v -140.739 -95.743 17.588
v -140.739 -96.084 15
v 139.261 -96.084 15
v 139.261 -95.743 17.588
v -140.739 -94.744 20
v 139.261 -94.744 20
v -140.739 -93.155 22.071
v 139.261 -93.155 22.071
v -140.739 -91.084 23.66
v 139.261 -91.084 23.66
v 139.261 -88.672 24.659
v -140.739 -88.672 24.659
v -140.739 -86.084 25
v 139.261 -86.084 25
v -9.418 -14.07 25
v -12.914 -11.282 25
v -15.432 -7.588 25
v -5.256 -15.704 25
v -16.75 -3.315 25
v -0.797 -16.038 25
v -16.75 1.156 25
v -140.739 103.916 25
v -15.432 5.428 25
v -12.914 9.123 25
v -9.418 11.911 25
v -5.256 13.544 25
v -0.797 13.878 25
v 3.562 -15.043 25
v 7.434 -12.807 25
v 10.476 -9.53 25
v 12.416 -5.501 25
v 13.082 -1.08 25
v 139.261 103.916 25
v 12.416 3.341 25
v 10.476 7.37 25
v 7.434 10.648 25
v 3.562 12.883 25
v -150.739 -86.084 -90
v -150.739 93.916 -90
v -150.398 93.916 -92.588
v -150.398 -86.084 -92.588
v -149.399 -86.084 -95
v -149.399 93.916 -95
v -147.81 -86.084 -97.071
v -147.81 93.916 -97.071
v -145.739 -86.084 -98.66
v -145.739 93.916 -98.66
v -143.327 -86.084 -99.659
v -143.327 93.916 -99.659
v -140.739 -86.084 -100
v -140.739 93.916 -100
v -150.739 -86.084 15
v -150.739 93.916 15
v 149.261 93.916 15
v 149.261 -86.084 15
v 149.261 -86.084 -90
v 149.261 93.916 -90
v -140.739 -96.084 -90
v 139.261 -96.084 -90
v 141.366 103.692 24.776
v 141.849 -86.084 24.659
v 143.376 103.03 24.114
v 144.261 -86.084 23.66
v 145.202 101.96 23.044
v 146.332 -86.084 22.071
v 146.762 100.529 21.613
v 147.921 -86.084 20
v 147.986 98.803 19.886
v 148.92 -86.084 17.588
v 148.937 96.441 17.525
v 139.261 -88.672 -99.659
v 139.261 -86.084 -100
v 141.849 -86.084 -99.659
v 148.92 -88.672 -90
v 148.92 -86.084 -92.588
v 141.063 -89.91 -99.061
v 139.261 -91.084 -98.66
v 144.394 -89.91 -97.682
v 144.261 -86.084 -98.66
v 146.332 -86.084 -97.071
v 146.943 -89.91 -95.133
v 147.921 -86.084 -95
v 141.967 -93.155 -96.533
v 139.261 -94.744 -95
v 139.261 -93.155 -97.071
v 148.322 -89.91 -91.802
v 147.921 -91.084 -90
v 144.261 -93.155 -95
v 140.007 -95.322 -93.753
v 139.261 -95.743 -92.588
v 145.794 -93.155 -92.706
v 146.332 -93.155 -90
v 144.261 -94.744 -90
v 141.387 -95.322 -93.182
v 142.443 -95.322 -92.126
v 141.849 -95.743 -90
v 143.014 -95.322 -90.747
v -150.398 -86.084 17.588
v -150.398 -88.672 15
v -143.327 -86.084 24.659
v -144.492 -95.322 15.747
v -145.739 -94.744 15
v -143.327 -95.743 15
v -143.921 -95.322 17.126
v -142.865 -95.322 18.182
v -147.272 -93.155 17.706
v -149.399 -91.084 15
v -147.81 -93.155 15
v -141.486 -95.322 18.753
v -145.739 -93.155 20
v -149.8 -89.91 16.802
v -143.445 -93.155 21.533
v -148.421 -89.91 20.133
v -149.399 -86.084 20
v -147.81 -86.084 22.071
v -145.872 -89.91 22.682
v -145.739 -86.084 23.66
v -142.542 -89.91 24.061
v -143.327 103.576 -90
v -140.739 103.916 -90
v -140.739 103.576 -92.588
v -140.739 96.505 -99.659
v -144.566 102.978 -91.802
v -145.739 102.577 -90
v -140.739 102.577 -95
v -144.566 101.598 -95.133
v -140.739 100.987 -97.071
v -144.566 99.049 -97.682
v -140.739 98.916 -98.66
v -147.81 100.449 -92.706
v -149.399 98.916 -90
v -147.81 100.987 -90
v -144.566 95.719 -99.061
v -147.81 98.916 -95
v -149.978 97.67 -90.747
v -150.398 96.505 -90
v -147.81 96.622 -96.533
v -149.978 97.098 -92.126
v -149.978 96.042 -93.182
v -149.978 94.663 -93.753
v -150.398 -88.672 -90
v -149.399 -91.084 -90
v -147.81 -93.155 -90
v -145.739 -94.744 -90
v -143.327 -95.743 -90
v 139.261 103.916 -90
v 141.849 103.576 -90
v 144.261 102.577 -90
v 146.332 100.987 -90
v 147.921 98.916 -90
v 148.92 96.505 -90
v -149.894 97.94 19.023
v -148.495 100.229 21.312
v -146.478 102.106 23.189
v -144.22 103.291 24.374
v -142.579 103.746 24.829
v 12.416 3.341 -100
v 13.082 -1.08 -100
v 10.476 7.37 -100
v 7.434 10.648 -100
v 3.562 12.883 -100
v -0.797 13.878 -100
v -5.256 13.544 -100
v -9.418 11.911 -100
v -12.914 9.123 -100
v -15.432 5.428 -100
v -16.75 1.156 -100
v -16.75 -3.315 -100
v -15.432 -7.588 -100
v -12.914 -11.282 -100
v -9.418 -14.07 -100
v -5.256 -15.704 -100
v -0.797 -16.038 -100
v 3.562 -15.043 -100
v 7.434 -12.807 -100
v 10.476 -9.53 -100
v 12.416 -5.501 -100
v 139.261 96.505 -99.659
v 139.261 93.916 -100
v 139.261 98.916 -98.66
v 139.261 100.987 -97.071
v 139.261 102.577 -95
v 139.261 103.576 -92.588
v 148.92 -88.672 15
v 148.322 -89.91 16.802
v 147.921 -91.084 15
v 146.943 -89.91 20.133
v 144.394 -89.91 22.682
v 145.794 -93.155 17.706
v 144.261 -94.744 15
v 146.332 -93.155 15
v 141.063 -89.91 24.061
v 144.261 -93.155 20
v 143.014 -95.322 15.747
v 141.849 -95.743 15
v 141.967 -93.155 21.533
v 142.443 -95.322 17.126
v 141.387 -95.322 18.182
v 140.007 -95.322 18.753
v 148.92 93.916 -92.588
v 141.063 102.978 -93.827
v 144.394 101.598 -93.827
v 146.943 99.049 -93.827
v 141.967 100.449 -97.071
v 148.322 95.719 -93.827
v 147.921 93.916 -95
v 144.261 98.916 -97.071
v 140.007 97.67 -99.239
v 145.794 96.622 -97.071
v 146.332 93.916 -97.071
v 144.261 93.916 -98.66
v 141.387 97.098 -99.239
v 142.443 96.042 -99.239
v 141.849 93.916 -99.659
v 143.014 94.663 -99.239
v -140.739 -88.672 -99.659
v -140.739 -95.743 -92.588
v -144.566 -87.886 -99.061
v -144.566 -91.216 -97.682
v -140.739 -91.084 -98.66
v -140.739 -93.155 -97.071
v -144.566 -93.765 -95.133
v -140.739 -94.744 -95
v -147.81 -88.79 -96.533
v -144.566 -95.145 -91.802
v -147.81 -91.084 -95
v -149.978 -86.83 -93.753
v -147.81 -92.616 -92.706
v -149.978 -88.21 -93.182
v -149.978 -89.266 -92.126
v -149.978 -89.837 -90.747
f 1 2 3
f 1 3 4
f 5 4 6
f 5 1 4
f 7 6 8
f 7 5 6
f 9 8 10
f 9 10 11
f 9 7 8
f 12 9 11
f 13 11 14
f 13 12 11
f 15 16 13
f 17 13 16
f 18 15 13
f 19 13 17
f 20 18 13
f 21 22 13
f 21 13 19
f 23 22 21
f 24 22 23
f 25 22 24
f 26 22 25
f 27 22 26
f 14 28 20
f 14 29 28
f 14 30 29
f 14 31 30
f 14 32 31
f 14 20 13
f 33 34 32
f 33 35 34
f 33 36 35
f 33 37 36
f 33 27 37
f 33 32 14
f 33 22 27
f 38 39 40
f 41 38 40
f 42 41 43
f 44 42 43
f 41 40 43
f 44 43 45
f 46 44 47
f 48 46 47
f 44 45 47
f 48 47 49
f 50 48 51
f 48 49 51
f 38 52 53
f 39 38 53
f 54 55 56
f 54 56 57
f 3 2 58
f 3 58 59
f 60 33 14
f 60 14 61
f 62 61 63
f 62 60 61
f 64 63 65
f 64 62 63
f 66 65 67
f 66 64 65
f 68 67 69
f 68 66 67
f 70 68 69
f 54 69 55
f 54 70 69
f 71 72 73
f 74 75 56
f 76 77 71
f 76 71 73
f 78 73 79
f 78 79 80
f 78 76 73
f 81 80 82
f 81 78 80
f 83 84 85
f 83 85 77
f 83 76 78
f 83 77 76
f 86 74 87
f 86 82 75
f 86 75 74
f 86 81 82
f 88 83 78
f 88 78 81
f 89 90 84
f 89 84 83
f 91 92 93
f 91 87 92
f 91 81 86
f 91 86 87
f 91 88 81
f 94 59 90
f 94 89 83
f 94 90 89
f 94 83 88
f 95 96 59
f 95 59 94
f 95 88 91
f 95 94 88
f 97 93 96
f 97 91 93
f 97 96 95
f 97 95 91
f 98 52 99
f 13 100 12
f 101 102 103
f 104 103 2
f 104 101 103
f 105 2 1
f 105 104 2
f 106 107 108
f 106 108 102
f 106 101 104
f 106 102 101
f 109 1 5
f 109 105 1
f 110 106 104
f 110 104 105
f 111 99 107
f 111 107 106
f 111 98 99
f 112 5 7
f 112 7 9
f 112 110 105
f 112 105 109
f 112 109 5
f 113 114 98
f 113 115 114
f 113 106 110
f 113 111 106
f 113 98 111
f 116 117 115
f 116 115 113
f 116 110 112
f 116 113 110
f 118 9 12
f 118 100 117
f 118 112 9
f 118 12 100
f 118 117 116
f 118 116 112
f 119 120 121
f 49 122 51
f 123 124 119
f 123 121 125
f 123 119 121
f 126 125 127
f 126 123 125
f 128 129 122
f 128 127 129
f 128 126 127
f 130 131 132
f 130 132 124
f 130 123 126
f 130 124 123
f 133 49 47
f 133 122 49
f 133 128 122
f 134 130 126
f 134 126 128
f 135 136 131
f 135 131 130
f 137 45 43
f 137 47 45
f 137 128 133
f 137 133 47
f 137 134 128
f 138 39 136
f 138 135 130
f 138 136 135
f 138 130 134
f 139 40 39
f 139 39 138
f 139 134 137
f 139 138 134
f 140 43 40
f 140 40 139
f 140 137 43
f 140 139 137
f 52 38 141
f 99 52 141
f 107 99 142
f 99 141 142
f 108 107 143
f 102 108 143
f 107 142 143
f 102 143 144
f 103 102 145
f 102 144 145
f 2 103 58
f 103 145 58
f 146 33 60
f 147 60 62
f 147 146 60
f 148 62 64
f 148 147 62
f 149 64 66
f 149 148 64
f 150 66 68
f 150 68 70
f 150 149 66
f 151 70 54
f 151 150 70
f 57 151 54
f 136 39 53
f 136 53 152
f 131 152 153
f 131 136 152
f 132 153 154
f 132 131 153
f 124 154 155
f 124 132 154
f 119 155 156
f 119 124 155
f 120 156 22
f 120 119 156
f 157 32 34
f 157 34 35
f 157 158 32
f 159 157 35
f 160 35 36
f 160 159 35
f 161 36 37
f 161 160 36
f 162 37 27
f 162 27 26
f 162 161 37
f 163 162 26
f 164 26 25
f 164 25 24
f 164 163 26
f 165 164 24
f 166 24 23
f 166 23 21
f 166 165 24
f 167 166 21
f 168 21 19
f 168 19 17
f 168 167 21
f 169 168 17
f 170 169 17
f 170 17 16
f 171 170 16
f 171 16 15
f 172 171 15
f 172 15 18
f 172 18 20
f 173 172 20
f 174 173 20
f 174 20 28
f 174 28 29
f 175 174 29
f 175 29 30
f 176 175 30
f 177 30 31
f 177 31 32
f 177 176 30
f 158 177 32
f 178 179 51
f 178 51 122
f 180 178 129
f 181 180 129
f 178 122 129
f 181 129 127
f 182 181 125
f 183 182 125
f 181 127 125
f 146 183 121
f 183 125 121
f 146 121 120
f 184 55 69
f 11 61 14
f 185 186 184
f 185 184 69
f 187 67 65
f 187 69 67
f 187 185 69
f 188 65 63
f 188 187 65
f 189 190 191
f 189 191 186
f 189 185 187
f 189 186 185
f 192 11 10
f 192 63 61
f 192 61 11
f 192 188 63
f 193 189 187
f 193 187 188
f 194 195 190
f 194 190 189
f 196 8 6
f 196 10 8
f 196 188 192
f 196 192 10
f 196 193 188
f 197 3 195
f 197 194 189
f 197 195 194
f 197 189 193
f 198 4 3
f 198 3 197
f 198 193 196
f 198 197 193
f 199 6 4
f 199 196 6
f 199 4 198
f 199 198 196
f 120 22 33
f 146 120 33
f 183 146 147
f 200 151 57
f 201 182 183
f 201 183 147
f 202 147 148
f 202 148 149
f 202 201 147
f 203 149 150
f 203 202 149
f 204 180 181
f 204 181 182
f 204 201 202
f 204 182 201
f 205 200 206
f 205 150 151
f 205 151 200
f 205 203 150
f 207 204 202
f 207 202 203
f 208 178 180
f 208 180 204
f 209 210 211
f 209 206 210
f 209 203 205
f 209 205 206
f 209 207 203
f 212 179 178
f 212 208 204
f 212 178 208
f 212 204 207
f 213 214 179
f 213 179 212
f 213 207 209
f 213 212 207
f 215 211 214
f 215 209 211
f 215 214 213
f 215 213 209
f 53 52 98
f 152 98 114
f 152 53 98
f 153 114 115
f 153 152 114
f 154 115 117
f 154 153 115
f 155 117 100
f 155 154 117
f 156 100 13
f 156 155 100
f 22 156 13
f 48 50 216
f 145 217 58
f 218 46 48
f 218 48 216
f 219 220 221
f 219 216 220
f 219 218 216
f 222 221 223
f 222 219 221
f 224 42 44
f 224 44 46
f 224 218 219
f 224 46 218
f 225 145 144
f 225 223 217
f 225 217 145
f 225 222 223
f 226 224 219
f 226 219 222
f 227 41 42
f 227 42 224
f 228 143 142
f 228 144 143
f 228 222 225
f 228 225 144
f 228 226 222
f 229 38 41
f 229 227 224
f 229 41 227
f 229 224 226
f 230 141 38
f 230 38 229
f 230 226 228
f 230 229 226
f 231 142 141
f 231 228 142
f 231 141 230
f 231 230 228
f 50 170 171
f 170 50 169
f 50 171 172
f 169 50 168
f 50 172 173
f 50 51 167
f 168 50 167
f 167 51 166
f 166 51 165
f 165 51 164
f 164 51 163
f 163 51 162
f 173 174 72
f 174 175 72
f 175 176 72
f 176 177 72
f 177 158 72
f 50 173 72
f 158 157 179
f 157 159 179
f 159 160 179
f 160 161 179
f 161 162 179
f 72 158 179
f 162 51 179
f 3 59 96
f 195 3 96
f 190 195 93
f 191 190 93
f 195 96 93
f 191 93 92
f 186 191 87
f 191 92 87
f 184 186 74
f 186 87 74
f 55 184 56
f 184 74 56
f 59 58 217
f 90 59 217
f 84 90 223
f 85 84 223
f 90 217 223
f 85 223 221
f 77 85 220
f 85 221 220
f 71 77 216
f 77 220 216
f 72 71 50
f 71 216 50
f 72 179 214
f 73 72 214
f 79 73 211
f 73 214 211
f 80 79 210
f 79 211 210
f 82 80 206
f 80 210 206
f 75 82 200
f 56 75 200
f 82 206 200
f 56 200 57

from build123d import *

# Parameters (mm, degrees)
F0_W         = 300
F0_H         = 200
F0_R         = 15
F1_DEPTH     = 25
F2_DEPTH     = 100
F3_R         = 10
F6_T1_DEPTH  = 105
F6_T3_DEPTH  = 180
F6_T5_DEPTH  = 130
F6_T7_DEPTH  = 280
F6_T9_DEPTH  = 140
F6_T11_DEPTH = 215
F6_S15_W     = 10.2
F6_S15_H     = 10.2
F6_T16_DEPTH = 10.2
F6_S21_W     = 10.2
F6_S21_H     = 10.2
F6_T22_DEPTH = 10.2
F6_S27_W     = 10.2
F6_S27_H     = 10.2
F6_T28_DEPTH = 10.2
F6_S33_W     = 10.2
F6_S33_H     = 10.2
F6_T34_DEPTH = 10.2
F6_S39_W     = 10.2
F6_S39_H     = 10.2
F6_T40_DEPTH = 10.2
F6_T44_ANGLE = 90


# Not quite as in the source:
# - a fillet or chamfer that OpenCascade refuses, or shapes differently, is made with other operations: its cross-section is extruded or revolved along the edge and cut away or added
# - a feature of the source that left no trace in its solid (it failed there, or was rolled back) is left out


with BuildPart() as f1:
    # F0 (on Top) → F1 (new body)
    with BuildSketch(Plane.XY):
        with Locations((-0.7391218096, 3.9163683355)):
            Rectangle(F0_W, F0_H)
        with Locations((-1.9179330509, -1.0798395535)):
            Circle(F0_R, mode=Mode.SUBTRACT)
    extrude(amount=F1_DEPTH)

    # F0 (on Top) → F2 (join)
    with BuildSketch(Plane.XY):
        with Locations((-0.7391218096, 3.9163683355)):
            Rectangle(F0_W, F0_H)
        with Locations((-1.9179330509, -1.0798395535)):
            Circle(F0_R, mode=Mode.SUBTRACT)
    extrude(amount=-F2_DEPTH)

    # F3
    f3_edges = [f1.edges().sort_by_distance(p)[0] for p in [
        (-150.739122, 3.916368, 25),
    ]]
    fillet(f3_edges, radius=F3_R)

    # F6: fillet of radius 10 on 11 edges, made by hand

    # F6_s2 → F6_t1 (cut)
    with BuildSketch(Plane.XY.offset(-90)):
        with BuildLine():
            ThreePointArc((-150.7391218096, -86.0836316645), (-147.8101896215, -93.1546994763), (-140.7391218096, -96.0836316645))
            Line((-140.7391218096, -96.0836316645), (-150.7391218096, -96.0836316645))
            Line((-150.7391218096, -96.0836316645), (-150.7391218096, -86.0836316645))
        make_face()
        with BuildLine():
            ThreePointArc((139.2608781904, -96.0836316645), (146.3319460023, -93.1546994763), (149.2608781904, -86.0836316645))
            Line((149.2608781904, -86.0836316645), (149.2608781904, -96.0836316645))
            Line((149.2608781904, -96.0836316645), (139.2608781904, -96.0836316645))
        make_face()
    extrude(amount=F6_T1_DEPTH, mode=Mode.SUBTRACT)

    # F6_s4 → F6_t3 (cut)
    with BuildSketch(Plane.XZ.offset(-93.9163683355)):
        with BuildLine():
            ThreePointArc((-150.7391218096, -90), (-147.8101896215, -97.0710678119), (-140.7391218096, -100))
            Line((-140.7391218096, -100), (-150.7391218096, -100))
            Line((-150.7391218096, -100), (-150.7391218096, -90))
        make_face()
        with BuildLine():
            ThreePointArc((139.2608781904, -100), (146.3319460023, -97.0710678119), (149.2608781904, -90))
            Line((149.2608781904, -90), (149.2608781904, -100))
            Line((149.2608781904, -100), (139.2608781904, -100))
        make_face()
    extrude(amount=F6_T3_DEPTH, mode=Mode.SUBTRACT)

    # F6_s6 → F6_t5 (cut)
    with BuildSketch(Plane.XY.offset(-90)):
        with BuildLine():
            ThreePointArc((-150.7391218096, 93.9163683355), (-147.8101896215, 100.9874361474), (-140.7391218096, 103.9163683355))
            Line((-140.7391218096, 103.9163683355), (-150.7391218096, 103.9163683355))
            Line((-150.7391218096, 103.9163683355), (-150.7391218096, 93.9163683355))
        make_face()
    extrude(amount=F6_T5_DEPTH, mode=Mode.SUBTRACT)

    # F6_s8 → F6_t7 (cut)
    with BuildSketch(Plane.YZ.offset(-140.7391218096)):
        with BuildLine():
            ThreePointArc((-96.0836316645, -90), (-93.1546994763, -97.0710678119), (-86.0836316645, -100))
            Line((-86.0836316645, -100), (-96.0836316645, -100))
            Line((-96.0836316645, -100), (-96.0836316645, -90))
        make_face()
        with BuildLine():
            ThreePointArc((-96.0836316645, 15), (-93.1546994763, 22.0710678119), (-86.0836316645, 25))
            Line((-86.0836316645, 25), (-96.0836316645, 25))
            Line((-96.0836316645, 25), (-96.0836316645, 15))
        make_face()
        with BuildLine():
            ThreePointArc((93.9163683355, -100), (100.9874361474, -97.0710678119), (103.9163683355, -90))
            Line((103.9163683355, -90), (103.9163683355, -100))
            Line((103.9163683355, -100), (93.9163683355, -100))
        make_face()
    extrude(amount=F6_T7_DEPTH, mode=Mode.SUBTRACT)

    # F6_s10 → F6_t9 (cut)
    with BuildSketch(Plane.XY.offset(-90)):
        with BuildLine():
            ThreePointArc((139.2608781904, 103.9163683355), (146.3319460023, 100.9874361474), (149.2608781904, 93.9163683355))
            Line((149.2608781904, 93.9163683355), (149.2608781904, 103.9163683355))
            Line((149.2608781904, 103.9163683355), (139.2608781904, 103.9163683355))
        make_face()
    extrude(amount=F6_T9_DEPTH, mode=Mode.SUBTRACT)

    # F6_s12 → F6_t11 (cut)
    with BuildSketch(Plane.XZ.offset(-128.9163683355)):
        with BuildLine():
            ThreePointArc((139.2608781904, 25), (146.3319460023, 22.0710678119), (149.2608781904, 15))
            Line((149.2608781904, 15), (149.2608781904, 25))
            Line((149.2608781904, 25), (139.2608781904, 25))
        make_face()
    extrude(amount=F6_T11_DEPTH, mode=Mode.SUBTRACT)


with BuildPart() as f6_tool14:
    # F6_s15 → F6_t16 (new body)
    with BuildSketch(Plane.YZ.offset(-140.7391218096)):
        with Locations((-91.1836316645, -95.1)):
            Rectangle(F6_S15_W, F6_S15_H)
    extrude(amount=-F6_T16_DEPTH)

    # F6_s17 → F6_t18 (revolve, cut)
    with BuildSketch(Plane(origin=(-140.7391218096, -86.0836316645, -90), x_dir=(0, 0.7071067812, 0.7071067812), z_dir=(0, -0.7071067812, 0.7071067812))):
        with BuildLine():
            ThreePointArc((0, -10), (10, 0), (0, 10))
            Line((0, 10), (0, -10))
        make_face()
    revolve(axis=Axis((-140.7391218096, -86.0836316645, -90), (-1, 0, 0)), mode=Mode.SUBTRACT)


with BuildPart() as f1_1:
    add(f1.part)

    # F6_t13: cut F6_tool14
    add(f6_tool14.part, mode=Mode.SUBTRACT)


with BuildPart() as f6_tool20:
    # F6_s21 → F6_t22 (new body)
    with BuildSketch(Plane.YZ.offset(-140.7391218096)):
        with Locations((99.0163683355, -95.1)):
            Rectangle(F6_S21_W, F6_S21_H)
    extrude(amount=-F6_T22_DEPTH)

    # F6_s23 → F6_t24 (revolve, cut)
    with BuildSketch(Plane(origin=(-140.7391218096, 93.9163683355, -90), x_dir=(0, -0.7071067812, 0.7071067812), z_dir=(0, -0.7071067812, -0.7071067812))):
        with BuildLine():
            ThreePointArc((0, -10), (10, 0), (0, 10))
            Line((0, 10), (0, -10))
        make_face()
    revolve(axis=Axis((-140.7391218096, 93.9163683355, -90), (-1, 0, 0)), mode=Mode.SUBTRACT)


with BuildPart() as f1_2:
    add(f1_1.part)

    # F6_t19: cut F6_tool20
    add(f6_tool20.part, mode=Mode.SUBTRACT)


with BuildPart() as f6_tool26:
    # F6_s27 → F6_t28 (new body)
    with BuildSketch(Plane.XZ.offset(86.0836316645)):
        with Locations((144.3608781904, -95.1)):
            Rectangle(F6_S27_W, F6_S27_H)
    extrude(amount=F6_T28_DEPTH)

    # F6_s29 → F6_t30 (revolve, cut)
    with BuildSketch(Plane(origin=(139.2608781904, -86.0836316645, -90), x_dir=(-0.7071067812, 0, 0.7071067812), z_dir=(0.7071067812, 0, 0.7071067812))):
        with BuildLine():
            ThreePointArc((0, -10), (10, 0), (0, 10))
            Line((0, 10), (0, -10))
        make_face()
    revolve(axis=Axis((139.2608781904, -86.0836316645, -90), (0, -1, 0)), mode=Mode.SUBTRACT)


with BuildPart() as f1_3:
    add(f1_2.part)

    # F6_t25: cut F6_tool26
    add(f6_tool26.part, mode=Mode.SUBTRACT)


with BuildPart() as f6_tool32:
    # F6_s33 → F6_t34 (new body)
    with BuildSketch(Plane.XZ.offset(86.0836316645)):
        with Locations((144.3608781904, 20.1)):
            Rectangle(F6_S33_W, F6_S33_H)
    extrude(amount=F6_T34_DEPTH)

    # F6_s35 → F6_t36 (revolve, cut)
    with BuildSketch(Plane(origin=(139.2608781904, -86.0836316645, 15), x_dir=(-0.7071067812, 0, -0.7071067812), z_dir=(-0.7071067812, 0, 0.7071067812))):
        with BuildLine():
            ThreePointArc((0, -10), (10, 0), (0, 10))
            Line((0, 10), (0, -10))
        make_face()
    revolve(axis=Axis((139.2608781904, -86.0836316645, 15), (0, -1, 0)), mode=Mode.SUBTRACT)


with BuildPart() as f1_4:
    add(f1_3.part)

    # F6_t31: cut F6_tool32
    add(f6_tool32.part, mode=Mode.SUBTRACT)


with BuildPart() as f6_tool38:
    # F6_s39 → F6_t40 (new body)
    with BuildSketch(Plane.XY.offset(-90)):
        with Locations((144.3608781904, 99.0163683355)):
            Rectangle(F6_S39_W, F6_S39_H)
    extrude(amount=-F6_T40_DEPTH)

    # F6_s41 → F6_t42 (revolve, cut)
    with BuildSketch(Plane(origin=(139.2608781904, 93.9163683355, -90), x_dir=(-0.7071067812, -0.7071067812, 0), z_dir=(0.7071067812, -0.7071067812, 0))):
        with BuildLine():
            ThreePointArc((0, -10), (10, 0), (0, 10))
            Line((0, 10), (0, -10))
        make_face()
    revolve(axis=Axis((139.2608781904, 93.9163683355, -90), (0, 0, -1)), mode=Mode.SUBTRACT)


with BuildPart() as f1_5:
    add(f1_4.part)

    # F6_t37: cut F6_tool38
    add(f6_tool38.part, mode=Mode.SUBTRACT)

    # F6_s43 → F6_t44 (revolve, cut)
    with BuildSketch(Plane.XY.offset(15)):
        with BuildLine():
            ThreePointArc((-140.7391218096, -96.0836316645), (-147.8101896215, -93.1546994763), (-150.7391218096, -86.0836316645))
            Line((-150.7391218096, -86.0836316645), (-150.7391218096, -96.0836316645))
            Line((-150.7391218096, -96.0836316645), (-140.7391218096, -96.0836316645))
        make_face()
    revolve(axis=Axis((-140.7391218096, -96.0836316645, 15), (0, 1, 0)), revolution_arc=F6_T44_ANGLE, mode=Mode.SUBTRACT)


solid = f1_5.part
